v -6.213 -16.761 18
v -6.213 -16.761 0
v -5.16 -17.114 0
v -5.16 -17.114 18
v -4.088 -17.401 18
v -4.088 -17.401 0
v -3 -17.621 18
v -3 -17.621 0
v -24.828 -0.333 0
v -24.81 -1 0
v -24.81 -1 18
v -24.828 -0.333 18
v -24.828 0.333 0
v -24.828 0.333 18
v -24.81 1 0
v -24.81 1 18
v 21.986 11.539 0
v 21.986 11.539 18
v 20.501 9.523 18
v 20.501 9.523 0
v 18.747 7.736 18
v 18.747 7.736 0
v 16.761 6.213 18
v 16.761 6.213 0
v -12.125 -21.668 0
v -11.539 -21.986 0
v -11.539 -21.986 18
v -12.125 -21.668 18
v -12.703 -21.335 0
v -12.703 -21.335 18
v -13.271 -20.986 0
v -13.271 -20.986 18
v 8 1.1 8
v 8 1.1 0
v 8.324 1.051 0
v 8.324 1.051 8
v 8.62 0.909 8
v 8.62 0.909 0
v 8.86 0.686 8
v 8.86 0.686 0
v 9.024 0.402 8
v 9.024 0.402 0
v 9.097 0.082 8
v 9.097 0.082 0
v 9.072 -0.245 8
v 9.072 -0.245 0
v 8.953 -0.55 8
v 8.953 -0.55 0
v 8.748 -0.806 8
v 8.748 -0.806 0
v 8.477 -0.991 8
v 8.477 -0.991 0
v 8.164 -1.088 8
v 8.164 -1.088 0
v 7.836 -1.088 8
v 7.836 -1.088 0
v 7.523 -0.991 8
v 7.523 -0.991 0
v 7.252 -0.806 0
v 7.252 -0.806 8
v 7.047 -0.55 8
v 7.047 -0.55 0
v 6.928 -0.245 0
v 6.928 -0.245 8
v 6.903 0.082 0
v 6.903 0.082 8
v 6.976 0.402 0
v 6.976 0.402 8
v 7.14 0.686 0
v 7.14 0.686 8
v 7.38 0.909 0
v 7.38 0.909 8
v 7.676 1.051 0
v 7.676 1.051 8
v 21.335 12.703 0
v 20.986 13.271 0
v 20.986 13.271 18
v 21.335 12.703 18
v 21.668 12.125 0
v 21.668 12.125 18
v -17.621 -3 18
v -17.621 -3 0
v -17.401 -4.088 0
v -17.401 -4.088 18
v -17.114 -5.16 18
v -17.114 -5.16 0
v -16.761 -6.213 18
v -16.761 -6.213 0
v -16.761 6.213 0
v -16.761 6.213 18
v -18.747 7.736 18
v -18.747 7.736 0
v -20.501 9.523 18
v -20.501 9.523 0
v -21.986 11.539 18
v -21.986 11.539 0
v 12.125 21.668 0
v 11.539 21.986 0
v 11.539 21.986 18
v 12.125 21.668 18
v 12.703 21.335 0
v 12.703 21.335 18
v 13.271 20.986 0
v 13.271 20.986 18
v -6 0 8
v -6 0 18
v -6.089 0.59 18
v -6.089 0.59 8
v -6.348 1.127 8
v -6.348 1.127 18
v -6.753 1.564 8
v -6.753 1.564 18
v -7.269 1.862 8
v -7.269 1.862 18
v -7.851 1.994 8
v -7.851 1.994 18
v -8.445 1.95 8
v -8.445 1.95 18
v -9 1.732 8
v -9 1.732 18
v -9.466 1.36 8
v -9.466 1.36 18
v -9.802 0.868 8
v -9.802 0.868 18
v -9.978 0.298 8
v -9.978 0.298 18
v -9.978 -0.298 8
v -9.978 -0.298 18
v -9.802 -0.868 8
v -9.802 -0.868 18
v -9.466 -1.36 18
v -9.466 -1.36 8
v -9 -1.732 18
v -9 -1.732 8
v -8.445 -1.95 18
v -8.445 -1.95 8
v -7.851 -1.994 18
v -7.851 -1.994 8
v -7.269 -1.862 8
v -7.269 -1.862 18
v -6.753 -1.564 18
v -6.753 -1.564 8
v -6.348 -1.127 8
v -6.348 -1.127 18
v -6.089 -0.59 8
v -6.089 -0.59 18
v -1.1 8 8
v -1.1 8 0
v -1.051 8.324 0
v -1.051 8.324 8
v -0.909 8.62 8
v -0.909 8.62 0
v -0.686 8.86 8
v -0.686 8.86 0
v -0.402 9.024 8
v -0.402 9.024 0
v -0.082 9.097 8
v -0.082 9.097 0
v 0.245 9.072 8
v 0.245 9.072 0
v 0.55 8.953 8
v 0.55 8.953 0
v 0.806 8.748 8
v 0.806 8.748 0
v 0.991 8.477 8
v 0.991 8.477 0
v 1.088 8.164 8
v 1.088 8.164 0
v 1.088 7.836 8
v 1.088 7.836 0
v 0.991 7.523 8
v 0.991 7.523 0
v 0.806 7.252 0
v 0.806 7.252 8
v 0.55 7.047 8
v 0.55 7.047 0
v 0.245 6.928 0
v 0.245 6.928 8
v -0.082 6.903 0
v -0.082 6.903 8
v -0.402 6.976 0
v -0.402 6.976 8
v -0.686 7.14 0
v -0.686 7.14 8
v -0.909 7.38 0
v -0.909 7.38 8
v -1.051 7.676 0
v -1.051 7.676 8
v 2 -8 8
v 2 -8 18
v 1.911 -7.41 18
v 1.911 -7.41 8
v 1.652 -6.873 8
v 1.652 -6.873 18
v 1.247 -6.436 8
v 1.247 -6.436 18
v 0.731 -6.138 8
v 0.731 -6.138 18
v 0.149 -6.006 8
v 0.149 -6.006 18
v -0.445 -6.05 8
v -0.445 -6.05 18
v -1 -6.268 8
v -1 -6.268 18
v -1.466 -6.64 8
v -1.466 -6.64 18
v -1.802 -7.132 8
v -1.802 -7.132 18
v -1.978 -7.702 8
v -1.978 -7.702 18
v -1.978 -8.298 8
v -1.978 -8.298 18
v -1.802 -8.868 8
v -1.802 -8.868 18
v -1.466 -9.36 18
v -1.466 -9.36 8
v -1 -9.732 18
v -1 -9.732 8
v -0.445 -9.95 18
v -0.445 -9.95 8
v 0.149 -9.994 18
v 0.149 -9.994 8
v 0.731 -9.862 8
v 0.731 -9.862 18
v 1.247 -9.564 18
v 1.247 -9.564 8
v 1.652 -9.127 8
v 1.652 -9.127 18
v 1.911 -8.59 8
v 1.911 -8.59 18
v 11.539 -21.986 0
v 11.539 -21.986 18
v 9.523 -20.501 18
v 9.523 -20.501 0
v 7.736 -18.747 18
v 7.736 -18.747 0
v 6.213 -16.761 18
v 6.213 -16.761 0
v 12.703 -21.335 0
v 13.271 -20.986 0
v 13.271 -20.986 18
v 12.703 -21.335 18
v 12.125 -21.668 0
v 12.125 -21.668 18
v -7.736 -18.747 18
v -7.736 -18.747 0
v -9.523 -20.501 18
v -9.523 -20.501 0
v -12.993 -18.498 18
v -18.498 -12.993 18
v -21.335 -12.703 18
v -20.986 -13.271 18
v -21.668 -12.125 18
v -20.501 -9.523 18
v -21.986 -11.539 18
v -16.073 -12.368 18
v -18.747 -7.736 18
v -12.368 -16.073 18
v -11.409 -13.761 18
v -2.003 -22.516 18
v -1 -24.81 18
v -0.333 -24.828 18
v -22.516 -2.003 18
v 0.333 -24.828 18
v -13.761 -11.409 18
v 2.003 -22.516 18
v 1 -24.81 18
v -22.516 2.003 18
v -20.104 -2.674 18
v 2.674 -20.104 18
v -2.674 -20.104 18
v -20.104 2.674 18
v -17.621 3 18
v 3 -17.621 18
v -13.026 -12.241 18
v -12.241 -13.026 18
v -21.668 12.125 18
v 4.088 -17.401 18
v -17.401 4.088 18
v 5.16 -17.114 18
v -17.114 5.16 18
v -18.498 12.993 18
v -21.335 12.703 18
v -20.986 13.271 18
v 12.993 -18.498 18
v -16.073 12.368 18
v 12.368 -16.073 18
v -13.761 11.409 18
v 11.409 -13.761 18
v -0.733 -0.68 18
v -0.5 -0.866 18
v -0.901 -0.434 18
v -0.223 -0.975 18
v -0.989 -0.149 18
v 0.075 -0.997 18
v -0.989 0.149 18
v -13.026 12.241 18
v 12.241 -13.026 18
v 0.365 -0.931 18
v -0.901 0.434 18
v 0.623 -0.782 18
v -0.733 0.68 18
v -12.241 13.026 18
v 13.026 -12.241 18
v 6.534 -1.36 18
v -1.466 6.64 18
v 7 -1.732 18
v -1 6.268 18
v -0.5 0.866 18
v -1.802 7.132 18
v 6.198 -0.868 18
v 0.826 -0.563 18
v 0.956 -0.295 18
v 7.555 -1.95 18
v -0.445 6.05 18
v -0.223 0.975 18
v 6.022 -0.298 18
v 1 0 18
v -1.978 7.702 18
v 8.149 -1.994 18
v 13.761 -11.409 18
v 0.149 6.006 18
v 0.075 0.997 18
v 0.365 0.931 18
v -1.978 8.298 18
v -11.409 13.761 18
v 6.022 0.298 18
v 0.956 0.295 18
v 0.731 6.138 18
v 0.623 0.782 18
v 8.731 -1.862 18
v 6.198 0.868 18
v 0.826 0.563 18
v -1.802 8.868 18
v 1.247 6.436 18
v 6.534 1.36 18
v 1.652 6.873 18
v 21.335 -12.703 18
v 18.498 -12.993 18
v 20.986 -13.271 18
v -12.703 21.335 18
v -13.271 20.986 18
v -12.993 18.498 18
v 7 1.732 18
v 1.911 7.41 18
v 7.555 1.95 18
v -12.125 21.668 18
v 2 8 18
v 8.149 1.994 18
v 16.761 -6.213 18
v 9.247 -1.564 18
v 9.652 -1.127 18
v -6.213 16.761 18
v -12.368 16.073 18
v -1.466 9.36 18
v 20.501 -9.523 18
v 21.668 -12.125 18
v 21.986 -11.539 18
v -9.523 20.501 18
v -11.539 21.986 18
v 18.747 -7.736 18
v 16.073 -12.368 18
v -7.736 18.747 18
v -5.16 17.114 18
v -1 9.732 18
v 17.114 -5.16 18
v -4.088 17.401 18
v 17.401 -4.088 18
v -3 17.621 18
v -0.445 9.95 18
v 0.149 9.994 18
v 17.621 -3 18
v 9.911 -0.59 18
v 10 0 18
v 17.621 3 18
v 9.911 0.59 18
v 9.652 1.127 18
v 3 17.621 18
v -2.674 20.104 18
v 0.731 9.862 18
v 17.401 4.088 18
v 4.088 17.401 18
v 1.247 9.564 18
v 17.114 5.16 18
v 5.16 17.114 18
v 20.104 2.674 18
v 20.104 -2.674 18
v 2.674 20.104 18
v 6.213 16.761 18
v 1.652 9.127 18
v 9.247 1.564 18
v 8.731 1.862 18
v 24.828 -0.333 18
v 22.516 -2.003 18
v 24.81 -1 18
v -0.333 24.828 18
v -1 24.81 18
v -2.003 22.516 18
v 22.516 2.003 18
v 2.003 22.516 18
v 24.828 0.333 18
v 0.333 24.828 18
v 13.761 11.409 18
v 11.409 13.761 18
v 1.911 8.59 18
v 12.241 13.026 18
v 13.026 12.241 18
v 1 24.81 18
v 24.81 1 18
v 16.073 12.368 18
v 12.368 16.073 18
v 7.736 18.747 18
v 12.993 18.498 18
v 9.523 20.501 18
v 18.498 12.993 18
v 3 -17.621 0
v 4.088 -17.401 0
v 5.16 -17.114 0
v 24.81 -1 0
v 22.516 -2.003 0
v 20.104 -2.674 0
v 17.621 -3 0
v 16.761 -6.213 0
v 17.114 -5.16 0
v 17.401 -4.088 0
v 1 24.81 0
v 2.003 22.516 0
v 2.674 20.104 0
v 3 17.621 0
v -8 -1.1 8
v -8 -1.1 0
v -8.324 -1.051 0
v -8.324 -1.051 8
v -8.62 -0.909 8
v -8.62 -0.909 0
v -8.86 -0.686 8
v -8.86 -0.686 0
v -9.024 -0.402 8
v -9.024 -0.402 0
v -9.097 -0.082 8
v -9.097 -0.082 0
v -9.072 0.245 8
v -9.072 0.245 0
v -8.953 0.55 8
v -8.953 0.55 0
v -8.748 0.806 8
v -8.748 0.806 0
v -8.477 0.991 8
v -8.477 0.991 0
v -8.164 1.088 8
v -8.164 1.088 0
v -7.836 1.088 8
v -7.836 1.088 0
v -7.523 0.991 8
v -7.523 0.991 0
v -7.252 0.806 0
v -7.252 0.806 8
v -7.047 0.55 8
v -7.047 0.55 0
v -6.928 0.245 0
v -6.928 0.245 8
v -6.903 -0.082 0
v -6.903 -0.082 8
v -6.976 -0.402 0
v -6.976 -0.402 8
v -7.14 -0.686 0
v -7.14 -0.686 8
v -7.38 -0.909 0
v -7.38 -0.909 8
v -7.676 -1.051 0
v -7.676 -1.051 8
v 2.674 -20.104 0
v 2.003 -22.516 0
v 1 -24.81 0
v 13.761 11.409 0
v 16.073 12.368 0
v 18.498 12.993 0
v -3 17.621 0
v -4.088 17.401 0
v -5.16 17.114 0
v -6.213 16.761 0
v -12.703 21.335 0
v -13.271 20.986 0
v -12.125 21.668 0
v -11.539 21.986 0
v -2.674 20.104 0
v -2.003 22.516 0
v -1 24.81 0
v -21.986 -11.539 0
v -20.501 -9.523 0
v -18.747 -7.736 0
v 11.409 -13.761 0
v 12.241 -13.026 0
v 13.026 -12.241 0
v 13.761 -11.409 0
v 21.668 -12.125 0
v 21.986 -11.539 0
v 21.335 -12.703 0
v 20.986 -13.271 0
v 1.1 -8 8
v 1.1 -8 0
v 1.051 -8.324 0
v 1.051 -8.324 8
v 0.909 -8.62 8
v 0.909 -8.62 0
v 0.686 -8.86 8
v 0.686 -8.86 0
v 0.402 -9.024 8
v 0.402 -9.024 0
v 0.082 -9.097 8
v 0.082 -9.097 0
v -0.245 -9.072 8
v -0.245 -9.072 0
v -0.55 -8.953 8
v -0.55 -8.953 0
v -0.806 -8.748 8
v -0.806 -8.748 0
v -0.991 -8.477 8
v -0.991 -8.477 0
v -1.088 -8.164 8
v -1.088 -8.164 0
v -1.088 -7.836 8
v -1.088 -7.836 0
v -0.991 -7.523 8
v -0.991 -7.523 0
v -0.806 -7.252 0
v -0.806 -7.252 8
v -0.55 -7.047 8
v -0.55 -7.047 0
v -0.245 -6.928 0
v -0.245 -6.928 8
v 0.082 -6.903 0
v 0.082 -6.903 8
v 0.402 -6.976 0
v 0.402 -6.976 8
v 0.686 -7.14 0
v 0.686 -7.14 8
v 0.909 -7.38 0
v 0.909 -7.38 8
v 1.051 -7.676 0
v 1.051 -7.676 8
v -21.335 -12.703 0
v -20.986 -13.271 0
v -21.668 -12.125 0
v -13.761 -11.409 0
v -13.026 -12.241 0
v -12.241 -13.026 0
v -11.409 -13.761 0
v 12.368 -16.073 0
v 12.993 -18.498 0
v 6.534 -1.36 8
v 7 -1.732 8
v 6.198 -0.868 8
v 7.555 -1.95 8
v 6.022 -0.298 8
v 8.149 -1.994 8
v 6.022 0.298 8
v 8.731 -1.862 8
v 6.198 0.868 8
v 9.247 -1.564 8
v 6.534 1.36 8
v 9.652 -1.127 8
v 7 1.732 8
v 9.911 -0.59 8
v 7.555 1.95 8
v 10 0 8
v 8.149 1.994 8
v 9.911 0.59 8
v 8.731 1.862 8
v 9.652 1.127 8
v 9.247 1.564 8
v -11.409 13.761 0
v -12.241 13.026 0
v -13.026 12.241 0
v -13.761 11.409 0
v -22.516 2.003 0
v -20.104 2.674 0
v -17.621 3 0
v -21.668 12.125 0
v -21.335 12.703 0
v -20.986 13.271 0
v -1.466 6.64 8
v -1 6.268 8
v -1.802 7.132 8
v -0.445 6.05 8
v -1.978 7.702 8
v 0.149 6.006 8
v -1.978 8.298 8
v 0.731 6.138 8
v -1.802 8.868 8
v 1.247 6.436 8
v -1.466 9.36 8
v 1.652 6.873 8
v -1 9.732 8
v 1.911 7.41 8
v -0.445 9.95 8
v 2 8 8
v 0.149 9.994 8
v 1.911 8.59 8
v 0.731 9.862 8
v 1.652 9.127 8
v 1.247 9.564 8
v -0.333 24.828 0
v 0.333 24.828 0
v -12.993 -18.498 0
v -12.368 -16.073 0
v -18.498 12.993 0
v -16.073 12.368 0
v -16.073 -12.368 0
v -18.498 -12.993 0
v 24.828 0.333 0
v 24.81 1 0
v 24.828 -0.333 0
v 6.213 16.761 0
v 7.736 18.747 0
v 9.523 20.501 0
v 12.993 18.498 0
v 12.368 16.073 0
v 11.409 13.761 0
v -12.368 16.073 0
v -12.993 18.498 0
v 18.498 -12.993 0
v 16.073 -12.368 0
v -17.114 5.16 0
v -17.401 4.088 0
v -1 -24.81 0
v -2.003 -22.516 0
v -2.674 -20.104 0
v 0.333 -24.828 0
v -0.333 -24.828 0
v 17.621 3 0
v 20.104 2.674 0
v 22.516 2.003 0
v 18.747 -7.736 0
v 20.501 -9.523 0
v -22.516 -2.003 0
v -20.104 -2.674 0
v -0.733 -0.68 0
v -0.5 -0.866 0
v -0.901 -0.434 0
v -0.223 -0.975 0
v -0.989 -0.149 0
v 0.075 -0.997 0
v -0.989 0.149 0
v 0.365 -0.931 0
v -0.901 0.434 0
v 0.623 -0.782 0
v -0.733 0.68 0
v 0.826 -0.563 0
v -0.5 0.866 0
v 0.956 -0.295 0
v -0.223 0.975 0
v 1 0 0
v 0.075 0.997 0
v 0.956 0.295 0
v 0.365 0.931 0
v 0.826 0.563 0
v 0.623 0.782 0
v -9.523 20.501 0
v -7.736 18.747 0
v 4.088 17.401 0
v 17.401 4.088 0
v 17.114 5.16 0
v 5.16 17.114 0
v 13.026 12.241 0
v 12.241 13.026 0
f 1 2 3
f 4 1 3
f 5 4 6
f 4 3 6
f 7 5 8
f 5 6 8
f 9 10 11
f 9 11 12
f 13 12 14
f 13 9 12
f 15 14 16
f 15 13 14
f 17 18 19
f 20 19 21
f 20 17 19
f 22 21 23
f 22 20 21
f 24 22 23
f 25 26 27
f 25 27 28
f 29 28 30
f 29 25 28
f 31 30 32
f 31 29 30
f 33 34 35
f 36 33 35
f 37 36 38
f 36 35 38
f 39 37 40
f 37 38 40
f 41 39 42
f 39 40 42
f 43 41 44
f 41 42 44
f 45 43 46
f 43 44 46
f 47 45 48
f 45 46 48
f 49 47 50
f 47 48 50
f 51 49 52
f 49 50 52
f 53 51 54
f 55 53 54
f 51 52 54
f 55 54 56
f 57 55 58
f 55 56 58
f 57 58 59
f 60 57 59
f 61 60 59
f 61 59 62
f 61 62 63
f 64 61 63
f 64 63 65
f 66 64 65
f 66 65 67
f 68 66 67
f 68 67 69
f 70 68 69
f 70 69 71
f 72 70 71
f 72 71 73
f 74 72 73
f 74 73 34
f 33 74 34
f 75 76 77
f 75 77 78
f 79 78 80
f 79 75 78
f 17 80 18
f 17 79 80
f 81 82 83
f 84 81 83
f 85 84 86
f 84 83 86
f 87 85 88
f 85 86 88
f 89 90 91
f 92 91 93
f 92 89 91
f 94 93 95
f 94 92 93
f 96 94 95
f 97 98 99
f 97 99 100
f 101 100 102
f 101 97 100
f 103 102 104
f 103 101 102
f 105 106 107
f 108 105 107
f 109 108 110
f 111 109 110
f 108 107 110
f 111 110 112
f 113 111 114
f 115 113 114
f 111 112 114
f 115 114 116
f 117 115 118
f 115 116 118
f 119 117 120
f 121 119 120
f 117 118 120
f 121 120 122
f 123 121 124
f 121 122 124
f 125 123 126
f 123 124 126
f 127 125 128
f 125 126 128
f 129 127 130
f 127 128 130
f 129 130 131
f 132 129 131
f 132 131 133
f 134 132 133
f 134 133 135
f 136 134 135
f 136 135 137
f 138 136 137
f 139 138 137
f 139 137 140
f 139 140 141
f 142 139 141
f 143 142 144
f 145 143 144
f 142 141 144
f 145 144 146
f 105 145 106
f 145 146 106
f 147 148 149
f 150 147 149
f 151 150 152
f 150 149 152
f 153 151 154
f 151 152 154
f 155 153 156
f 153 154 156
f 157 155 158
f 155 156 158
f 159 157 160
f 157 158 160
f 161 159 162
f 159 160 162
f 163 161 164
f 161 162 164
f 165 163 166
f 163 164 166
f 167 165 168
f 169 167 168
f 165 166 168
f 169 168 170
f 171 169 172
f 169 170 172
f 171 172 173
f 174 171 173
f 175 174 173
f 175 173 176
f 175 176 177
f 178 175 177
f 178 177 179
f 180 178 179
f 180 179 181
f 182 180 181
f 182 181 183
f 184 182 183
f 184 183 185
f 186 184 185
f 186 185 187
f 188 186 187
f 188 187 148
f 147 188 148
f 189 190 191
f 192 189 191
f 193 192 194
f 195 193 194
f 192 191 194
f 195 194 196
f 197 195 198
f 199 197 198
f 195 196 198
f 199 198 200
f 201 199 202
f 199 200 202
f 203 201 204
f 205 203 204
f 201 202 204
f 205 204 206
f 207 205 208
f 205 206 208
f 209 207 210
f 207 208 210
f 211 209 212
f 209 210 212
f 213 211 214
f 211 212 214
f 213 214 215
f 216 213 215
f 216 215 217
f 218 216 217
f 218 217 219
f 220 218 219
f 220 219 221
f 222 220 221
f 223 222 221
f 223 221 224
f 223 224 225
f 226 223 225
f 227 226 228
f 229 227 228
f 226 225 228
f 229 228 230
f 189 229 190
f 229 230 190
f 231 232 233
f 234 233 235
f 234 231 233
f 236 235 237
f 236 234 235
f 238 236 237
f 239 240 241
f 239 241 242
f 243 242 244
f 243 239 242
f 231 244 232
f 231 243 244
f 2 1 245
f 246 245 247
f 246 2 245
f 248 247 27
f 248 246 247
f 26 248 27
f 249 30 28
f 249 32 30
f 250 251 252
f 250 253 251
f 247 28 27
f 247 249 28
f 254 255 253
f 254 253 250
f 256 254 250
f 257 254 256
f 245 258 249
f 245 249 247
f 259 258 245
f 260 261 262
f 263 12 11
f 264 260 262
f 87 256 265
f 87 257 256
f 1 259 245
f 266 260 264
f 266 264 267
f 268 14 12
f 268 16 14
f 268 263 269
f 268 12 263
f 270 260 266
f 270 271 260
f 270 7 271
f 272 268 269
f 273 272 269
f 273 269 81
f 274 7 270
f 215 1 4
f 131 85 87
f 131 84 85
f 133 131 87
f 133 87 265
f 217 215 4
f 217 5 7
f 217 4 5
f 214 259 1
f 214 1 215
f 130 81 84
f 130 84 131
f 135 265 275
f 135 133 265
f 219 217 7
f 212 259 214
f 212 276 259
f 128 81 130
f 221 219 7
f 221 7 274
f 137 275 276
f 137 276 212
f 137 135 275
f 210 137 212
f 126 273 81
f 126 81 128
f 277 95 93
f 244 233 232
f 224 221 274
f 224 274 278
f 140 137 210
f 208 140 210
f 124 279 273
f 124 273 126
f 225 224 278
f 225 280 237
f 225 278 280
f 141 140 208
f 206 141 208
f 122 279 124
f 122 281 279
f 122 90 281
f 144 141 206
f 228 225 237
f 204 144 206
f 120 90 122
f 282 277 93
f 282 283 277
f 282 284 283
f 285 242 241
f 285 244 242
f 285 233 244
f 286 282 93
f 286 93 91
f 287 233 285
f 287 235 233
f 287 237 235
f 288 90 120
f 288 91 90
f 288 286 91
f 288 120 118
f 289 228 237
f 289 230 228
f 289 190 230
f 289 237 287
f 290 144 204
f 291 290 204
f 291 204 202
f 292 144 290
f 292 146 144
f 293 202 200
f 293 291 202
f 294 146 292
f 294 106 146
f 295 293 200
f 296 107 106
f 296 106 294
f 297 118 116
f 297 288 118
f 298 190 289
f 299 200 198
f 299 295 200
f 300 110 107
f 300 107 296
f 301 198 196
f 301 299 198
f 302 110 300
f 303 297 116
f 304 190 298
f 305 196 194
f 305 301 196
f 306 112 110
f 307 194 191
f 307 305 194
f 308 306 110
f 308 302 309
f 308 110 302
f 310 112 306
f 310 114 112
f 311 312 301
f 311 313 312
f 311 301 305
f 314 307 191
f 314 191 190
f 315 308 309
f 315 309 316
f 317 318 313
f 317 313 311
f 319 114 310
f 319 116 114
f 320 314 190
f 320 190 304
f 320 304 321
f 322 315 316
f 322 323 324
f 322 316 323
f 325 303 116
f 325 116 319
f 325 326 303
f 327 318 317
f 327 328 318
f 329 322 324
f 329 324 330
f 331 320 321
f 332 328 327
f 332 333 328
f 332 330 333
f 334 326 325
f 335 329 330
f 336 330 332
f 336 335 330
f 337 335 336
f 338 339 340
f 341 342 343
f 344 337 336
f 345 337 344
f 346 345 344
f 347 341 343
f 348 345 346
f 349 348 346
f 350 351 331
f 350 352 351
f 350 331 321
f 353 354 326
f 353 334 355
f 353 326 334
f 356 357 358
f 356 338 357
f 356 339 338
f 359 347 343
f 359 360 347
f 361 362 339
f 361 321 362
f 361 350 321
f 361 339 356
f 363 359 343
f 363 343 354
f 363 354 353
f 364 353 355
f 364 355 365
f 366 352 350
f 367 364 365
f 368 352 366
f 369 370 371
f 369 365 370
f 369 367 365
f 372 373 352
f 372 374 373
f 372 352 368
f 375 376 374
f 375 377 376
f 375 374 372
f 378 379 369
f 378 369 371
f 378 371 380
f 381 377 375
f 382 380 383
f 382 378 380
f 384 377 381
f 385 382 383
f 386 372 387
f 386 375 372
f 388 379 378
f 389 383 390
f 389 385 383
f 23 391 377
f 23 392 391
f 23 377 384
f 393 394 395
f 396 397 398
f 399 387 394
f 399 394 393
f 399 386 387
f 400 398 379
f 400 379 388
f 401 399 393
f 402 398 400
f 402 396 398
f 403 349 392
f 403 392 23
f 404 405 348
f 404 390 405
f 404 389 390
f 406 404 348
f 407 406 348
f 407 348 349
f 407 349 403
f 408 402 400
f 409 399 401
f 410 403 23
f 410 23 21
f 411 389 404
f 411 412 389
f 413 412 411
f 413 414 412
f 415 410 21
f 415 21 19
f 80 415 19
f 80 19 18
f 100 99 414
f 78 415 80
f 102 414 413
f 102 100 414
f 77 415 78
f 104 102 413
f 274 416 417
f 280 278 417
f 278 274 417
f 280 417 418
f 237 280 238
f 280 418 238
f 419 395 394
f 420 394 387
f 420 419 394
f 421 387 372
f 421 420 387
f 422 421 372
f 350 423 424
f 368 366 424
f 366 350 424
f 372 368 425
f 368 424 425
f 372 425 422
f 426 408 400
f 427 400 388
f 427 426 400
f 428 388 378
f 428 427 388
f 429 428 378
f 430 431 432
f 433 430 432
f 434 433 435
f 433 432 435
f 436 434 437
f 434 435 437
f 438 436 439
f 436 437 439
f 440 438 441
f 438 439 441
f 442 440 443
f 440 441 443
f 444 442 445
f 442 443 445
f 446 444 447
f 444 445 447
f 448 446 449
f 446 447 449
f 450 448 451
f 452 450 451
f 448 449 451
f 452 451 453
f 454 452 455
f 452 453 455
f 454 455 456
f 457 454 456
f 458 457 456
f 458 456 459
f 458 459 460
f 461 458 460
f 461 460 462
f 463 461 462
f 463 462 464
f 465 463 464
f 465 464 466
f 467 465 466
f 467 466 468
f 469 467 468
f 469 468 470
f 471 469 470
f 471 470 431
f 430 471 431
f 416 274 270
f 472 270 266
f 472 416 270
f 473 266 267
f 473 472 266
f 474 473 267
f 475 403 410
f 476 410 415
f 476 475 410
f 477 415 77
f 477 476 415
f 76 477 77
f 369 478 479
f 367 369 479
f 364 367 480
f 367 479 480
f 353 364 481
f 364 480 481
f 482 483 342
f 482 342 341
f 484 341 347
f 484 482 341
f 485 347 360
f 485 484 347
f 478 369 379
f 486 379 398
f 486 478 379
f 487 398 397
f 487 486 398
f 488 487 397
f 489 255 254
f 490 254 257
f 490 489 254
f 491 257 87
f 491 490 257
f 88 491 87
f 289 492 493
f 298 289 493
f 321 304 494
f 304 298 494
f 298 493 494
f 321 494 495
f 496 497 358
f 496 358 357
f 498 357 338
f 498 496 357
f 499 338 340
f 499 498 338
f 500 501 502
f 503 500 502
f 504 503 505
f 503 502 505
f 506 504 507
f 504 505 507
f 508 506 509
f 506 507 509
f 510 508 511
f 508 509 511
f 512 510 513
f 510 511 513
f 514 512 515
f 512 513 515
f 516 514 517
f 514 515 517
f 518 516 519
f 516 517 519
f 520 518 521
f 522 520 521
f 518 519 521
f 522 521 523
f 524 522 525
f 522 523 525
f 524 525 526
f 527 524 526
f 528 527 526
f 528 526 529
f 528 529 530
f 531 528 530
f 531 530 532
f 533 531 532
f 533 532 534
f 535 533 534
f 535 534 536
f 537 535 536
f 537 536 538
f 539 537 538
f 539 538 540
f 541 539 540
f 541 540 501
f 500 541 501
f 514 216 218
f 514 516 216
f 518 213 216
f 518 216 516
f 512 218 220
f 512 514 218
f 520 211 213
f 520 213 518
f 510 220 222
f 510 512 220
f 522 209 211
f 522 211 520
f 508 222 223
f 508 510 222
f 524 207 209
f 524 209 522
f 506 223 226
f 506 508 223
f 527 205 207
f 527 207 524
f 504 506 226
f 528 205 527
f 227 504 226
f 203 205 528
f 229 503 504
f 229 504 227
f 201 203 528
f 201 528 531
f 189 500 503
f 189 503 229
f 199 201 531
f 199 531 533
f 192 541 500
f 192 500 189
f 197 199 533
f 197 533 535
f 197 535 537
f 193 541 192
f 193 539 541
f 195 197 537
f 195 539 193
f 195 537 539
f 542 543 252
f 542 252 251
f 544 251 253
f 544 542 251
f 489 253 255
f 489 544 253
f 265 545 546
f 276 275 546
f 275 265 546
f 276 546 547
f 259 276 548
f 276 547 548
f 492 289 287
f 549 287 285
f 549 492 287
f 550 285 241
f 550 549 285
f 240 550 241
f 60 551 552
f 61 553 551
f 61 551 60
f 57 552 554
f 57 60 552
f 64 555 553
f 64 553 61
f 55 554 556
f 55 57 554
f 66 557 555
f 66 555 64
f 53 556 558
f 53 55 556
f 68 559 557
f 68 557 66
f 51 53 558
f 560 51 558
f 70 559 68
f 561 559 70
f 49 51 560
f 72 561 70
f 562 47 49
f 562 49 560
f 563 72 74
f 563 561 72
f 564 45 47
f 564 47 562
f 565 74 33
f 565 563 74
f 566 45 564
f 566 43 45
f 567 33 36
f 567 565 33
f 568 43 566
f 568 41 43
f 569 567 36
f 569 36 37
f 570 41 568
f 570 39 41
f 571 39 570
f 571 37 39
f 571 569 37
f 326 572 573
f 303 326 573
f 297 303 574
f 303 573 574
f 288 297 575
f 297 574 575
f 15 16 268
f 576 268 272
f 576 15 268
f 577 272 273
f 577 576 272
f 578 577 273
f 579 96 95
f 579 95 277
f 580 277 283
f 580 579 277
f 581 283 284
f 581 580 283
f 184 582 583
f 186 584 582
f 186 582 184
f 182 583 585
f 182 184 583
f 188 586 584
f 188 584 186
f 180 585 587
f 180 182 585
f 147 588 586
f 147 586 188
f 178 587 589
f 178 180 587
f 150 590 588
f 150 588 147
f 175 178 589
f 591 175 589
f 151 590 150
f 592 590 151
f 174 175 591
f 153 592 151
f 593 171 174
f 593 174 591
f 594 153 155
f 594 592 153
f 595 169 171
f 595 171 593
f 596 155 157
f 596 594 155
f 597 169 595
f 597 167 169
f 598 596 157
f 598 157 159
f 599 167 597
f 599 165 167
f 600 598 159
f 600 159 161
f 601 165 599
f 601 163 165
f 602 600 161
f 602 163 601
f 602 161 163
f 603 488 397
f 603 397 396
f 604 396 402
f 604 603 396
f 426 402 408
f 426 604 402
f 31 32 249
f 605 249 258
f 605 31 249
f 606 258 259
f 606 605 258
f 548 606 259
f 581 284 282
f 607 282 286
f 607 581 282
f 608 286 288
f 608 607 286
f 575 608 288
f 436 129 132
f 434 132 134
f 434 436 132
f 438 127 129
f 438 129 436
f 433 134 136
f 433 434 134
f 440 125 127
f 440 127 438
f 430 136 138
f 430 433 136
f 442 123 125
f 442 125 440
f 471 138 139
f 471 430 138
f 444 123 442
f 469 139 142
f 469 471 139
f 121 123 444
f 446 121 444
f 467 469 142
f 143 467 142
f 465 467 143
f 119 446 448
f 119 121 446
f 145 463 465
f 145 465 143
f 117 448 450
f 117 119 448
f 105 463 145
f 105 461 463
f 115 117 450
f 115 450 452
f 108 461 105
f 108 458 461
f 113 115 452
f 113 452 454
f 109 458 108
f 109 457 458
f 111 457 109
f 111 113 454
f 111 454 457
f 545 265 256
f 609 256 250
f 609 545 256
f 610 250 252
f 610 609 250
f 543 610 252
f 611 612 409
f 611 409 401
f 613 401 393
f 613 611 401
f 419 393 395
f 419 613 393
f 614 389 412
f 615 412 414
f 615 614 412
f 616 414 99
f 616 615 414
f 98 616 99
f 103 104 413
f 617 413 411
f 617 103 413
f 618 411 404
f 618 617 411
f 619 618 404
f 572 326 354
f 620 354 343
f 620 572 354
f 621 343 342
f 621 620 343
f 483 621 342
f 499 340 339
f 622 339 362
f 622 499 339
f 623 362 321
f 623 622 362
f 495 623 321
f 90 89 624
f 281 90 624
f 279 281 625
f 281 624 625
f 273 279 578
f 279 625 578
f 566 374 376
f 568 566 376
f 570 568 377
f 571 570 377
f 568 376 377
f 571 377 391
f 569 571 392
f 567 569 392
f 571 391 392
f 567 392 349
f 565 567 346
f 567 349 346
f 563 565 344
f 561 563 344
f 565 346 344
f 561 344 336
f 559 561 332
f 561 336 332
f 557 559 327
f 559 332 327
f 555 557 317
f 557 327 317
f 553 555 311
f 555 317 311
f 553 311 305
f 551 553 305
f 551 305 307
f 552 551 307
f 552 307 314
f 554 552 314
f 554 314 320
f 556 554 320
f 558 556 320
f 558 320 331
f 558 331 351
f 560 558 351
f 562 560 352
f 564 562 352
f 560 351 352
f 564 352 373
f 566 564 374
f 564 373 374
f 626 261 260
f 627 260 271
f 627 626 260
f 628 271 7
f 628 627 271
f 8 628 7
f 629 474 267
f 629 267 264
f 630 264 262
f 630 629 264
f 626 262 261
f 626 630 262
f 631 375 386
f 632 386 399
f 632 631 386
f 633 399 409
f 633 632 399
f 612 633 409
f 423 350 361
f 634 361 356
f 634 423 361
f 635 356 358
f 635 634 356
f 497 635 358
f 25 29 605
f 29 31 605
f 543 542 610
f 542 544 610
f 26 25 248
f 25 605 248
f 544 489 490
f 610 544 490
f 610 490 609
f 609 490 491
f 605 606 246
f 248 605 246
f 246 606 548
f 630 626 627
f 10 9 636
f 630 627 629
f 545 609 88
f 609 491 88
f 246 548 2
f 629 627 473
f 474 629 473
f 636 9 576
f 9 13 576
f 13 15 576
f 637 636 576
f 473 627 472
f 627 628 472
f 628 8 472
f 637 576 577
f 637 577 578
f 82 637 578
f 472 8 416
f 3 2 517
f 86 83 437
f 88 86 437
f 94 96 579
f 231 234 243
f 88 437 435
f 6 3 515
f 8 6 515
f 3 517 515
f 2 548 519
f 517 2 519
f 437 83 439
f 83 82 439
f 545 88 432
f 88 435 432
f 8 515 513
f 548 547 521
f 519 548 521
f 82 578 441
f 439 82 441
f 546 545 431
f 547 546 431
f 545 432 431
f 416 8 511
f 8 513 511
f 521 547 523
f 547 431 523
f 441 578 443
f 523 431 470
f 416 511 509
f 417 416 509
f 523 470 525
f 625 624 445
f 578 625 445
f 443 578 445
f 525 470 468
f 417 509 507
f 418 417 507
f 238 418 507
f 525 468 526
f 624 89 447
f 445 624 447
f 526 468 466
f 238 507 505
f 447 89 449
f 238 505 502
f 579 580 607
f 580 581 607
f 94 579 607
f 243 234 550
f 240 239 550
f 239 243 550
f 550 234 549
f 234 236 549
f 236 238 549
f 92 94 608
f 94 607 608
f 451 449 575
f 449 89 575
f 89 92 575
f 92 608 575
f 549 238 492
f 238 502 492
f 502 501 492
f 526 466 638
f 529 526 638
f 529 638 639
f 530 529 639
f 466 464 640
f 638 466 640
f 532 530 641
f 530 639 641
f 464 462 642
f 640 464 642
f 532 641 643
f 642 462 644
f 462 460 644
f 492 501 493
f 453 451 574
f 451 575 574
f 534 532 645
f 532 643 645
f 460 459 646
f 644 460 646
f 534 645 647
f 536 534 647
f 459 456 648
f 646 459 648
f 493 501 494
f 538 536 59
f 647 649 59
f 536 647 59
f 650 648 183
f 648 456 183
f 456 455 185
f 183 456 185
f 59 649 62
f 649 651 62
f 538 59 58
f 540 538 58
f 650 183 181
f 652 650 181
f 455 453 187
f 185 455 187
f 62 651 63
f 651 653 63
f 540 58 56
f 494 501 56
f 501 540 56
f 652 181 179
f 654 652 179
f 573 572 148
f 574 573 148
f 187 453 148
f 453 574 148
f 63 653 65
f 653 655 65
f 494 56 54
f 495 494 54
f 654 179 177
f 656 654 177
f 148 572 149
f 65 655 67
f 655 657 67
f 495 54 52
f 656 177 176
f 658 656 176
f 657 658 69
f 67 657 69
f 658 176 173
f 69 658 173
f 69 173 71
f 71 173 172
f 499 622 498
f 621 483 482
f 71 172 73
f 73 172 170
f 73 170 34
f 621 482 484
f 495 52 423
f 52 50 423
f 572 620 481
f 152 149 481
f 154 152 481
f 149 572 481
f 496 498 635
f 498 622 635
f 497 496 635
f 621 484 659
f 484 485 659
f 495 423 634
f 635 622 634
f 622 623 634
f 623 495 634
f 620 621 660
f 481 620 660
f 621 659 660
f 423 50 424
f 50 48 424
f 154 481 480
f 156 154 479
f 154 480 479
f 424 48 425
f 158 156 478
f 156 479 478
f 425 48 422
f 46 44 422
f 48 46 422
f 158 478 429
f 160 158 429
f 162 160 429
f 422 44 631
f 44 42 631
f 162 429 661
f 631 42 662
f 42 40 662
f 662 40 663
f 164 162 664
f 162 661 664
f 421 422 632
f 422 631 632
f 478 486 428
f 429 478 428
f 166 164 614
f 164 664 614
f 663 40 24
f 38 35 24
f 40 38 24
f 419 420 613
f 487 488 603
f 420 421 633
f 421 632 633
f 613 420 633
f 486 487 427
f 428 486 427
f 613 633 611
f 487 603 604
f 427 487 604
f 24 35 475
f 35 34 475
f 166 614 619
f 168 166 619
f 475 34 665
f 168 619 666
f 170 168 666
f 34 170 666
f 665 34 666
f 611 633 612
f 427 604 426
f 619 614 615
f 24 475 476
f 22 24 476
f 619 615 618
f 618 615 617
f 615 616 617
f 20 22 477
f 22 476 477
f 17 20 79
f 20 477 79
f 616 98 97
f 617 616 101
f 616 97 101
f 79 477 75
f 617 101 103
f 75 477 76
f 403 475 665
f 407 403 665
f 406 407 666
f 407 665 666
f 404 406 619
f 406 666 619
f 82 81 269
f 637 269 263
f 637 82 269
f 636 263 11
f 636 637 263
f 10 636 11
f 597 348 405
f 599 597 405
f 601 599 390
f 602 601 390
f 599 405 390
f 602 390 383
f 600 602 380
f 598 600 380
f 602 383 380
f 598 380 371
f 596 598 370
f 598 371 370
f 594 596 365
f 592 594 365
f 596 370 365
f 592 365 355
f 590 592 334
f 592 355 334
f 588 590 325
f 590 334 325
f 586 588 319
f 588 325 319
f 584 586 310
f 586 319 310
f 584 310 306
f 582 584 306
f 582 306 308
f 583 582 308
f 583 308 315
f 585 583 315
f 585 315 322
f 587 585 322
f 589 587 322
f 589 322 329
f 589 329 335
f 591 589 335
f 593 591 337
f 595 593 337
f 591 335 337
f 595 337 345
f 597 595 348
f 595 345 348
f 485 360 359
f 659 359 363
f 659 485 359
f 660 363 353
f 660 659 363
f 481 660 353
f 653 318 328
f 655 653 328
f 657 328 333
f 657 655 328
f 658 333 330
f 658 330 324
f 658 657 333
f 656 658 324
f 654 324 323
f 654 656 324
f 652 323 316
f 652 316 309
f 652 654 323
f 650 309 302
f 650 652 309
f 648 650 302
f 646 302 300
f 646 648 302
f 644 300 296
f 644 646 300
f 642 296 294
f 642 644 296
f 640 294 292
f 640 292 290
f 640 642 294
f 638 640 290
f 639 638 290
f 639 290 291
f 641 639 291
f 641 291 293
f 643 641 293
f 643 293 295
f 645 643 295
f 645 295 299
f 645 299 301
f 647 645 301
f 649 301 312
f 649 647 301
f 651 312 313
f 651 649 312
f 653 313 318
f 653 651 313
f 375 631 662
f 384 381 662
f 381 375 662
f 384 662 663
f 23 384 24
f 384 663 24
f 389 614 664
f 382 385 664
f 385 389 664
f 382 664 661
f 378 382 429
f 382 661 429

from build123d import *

# Parameters (mm, degrees)
EXTRUDE_1_DEPTH          = 18
SKETCH_2_R               = 17.875
SKETCH_2_R_2             = 1
EXTRUDE_2_DEPTH          = 18
PATTERN_CIRCULAR_3_COUNT = 12
SKETCH_3_R               = 1.1
CUT_EXTRUDE_1_DEPTH      = 19
PATTERN_CIRCULAR_4_COUNT = 4
SKETCH_4_R               = 2
CUT_EXTRUDE_2_DEPTH      = 10


with BuildPart() as part:
    # 草图1 → 凸台-拉伸1 (new body)
    with BuildSketch(Plane.XY):
        with BuildLine():
            ThreePointArc((3, 17.621453544), (0, 17.875), (-3, 17.621453544))
            ThreePointArc((-3, 17.621453544), (-2.381034791, 21.321544102), (-1, 24.809599575))
            ThreePointArc((-1, 24.809599575), (0, 24.830037117), (1, 24.809599575))
            ThreePointArc((1, 24.809599575), (2.381034791, 21.321544102), (3, 17.621453544))
        make_face()
    extrude_1 = extrude(amount=EXTRUDE_1_DEPTH)

    # 草图2 → 凸台-拉伸2 (add)
    with BuildSketch(Plane.XY):
        Circle(SKETCH_2_R)
        Circle(SKETCH_2_R_2, mode=Mode.SUBTRACT)
    extrude(amount=EXTRUDE_2_DEPTH)

    # 阵列(圆周)3: 凸台-拉伸1 ×12 about axis
    pattern_circular_3_axis = Axis((0, 0, 0), (0, 0, 1))
    for i in range(1, PATTERN_CIRCULAR_3_COUNT):
        add(extrude_1.rotate(pattern_circular_3_axis, i * 360 / PATTERN_CIRCULAR_3_COUNT))

    # 草图3 → 切除-拉伸1 (cut, through all)
    with BuildSketch(Plane(origin=(0, 0, 0), x_dir=(-1, 0, 0), z_dir=(0, 0, -1))):
        with Locations((0, 8)):
            Circle(SKETCH_3_R)
    cut_extrude_1 = extrude(amount=-CUT_EXTRUDE_1_DEPTH, mode=Mode.SUBTRACT)

    # 阵列(圆周)4: 切除-拉伸1 ×4 about axis
    pattern_circular_4_axis = Axis((0, 0, 0), (0, 0, 1))
    for i in range(1, PATTERN_CIRCULAR_4_COUNT):
        add(cut_extrude_1.rotate(pattern_circular_4_axis, i * 360 / PATTERN_CIRCULAR_4_COUNT), mode=Mode.SUBTRACT)

    # 草图4 → 切除-拉伸2 (cut)
    with BuildSketch(Plane.XY.offset(18)):
        with Locations((0, 8)):
            Circle(SKETCH_4_R)
        with Locations((8, 0)):
            Circle(SKETCH_4_R)
        with Locations((0, -8)):
            Circle(SKETCH_4_R)
        with Locations((-8, 0)):
            Circle(SKETCH_4_R)
    extrude(amount=-CUT_EXTRUDE_2_DEPTH, mode=Mode.SUBTRACT)


solid = part.part
